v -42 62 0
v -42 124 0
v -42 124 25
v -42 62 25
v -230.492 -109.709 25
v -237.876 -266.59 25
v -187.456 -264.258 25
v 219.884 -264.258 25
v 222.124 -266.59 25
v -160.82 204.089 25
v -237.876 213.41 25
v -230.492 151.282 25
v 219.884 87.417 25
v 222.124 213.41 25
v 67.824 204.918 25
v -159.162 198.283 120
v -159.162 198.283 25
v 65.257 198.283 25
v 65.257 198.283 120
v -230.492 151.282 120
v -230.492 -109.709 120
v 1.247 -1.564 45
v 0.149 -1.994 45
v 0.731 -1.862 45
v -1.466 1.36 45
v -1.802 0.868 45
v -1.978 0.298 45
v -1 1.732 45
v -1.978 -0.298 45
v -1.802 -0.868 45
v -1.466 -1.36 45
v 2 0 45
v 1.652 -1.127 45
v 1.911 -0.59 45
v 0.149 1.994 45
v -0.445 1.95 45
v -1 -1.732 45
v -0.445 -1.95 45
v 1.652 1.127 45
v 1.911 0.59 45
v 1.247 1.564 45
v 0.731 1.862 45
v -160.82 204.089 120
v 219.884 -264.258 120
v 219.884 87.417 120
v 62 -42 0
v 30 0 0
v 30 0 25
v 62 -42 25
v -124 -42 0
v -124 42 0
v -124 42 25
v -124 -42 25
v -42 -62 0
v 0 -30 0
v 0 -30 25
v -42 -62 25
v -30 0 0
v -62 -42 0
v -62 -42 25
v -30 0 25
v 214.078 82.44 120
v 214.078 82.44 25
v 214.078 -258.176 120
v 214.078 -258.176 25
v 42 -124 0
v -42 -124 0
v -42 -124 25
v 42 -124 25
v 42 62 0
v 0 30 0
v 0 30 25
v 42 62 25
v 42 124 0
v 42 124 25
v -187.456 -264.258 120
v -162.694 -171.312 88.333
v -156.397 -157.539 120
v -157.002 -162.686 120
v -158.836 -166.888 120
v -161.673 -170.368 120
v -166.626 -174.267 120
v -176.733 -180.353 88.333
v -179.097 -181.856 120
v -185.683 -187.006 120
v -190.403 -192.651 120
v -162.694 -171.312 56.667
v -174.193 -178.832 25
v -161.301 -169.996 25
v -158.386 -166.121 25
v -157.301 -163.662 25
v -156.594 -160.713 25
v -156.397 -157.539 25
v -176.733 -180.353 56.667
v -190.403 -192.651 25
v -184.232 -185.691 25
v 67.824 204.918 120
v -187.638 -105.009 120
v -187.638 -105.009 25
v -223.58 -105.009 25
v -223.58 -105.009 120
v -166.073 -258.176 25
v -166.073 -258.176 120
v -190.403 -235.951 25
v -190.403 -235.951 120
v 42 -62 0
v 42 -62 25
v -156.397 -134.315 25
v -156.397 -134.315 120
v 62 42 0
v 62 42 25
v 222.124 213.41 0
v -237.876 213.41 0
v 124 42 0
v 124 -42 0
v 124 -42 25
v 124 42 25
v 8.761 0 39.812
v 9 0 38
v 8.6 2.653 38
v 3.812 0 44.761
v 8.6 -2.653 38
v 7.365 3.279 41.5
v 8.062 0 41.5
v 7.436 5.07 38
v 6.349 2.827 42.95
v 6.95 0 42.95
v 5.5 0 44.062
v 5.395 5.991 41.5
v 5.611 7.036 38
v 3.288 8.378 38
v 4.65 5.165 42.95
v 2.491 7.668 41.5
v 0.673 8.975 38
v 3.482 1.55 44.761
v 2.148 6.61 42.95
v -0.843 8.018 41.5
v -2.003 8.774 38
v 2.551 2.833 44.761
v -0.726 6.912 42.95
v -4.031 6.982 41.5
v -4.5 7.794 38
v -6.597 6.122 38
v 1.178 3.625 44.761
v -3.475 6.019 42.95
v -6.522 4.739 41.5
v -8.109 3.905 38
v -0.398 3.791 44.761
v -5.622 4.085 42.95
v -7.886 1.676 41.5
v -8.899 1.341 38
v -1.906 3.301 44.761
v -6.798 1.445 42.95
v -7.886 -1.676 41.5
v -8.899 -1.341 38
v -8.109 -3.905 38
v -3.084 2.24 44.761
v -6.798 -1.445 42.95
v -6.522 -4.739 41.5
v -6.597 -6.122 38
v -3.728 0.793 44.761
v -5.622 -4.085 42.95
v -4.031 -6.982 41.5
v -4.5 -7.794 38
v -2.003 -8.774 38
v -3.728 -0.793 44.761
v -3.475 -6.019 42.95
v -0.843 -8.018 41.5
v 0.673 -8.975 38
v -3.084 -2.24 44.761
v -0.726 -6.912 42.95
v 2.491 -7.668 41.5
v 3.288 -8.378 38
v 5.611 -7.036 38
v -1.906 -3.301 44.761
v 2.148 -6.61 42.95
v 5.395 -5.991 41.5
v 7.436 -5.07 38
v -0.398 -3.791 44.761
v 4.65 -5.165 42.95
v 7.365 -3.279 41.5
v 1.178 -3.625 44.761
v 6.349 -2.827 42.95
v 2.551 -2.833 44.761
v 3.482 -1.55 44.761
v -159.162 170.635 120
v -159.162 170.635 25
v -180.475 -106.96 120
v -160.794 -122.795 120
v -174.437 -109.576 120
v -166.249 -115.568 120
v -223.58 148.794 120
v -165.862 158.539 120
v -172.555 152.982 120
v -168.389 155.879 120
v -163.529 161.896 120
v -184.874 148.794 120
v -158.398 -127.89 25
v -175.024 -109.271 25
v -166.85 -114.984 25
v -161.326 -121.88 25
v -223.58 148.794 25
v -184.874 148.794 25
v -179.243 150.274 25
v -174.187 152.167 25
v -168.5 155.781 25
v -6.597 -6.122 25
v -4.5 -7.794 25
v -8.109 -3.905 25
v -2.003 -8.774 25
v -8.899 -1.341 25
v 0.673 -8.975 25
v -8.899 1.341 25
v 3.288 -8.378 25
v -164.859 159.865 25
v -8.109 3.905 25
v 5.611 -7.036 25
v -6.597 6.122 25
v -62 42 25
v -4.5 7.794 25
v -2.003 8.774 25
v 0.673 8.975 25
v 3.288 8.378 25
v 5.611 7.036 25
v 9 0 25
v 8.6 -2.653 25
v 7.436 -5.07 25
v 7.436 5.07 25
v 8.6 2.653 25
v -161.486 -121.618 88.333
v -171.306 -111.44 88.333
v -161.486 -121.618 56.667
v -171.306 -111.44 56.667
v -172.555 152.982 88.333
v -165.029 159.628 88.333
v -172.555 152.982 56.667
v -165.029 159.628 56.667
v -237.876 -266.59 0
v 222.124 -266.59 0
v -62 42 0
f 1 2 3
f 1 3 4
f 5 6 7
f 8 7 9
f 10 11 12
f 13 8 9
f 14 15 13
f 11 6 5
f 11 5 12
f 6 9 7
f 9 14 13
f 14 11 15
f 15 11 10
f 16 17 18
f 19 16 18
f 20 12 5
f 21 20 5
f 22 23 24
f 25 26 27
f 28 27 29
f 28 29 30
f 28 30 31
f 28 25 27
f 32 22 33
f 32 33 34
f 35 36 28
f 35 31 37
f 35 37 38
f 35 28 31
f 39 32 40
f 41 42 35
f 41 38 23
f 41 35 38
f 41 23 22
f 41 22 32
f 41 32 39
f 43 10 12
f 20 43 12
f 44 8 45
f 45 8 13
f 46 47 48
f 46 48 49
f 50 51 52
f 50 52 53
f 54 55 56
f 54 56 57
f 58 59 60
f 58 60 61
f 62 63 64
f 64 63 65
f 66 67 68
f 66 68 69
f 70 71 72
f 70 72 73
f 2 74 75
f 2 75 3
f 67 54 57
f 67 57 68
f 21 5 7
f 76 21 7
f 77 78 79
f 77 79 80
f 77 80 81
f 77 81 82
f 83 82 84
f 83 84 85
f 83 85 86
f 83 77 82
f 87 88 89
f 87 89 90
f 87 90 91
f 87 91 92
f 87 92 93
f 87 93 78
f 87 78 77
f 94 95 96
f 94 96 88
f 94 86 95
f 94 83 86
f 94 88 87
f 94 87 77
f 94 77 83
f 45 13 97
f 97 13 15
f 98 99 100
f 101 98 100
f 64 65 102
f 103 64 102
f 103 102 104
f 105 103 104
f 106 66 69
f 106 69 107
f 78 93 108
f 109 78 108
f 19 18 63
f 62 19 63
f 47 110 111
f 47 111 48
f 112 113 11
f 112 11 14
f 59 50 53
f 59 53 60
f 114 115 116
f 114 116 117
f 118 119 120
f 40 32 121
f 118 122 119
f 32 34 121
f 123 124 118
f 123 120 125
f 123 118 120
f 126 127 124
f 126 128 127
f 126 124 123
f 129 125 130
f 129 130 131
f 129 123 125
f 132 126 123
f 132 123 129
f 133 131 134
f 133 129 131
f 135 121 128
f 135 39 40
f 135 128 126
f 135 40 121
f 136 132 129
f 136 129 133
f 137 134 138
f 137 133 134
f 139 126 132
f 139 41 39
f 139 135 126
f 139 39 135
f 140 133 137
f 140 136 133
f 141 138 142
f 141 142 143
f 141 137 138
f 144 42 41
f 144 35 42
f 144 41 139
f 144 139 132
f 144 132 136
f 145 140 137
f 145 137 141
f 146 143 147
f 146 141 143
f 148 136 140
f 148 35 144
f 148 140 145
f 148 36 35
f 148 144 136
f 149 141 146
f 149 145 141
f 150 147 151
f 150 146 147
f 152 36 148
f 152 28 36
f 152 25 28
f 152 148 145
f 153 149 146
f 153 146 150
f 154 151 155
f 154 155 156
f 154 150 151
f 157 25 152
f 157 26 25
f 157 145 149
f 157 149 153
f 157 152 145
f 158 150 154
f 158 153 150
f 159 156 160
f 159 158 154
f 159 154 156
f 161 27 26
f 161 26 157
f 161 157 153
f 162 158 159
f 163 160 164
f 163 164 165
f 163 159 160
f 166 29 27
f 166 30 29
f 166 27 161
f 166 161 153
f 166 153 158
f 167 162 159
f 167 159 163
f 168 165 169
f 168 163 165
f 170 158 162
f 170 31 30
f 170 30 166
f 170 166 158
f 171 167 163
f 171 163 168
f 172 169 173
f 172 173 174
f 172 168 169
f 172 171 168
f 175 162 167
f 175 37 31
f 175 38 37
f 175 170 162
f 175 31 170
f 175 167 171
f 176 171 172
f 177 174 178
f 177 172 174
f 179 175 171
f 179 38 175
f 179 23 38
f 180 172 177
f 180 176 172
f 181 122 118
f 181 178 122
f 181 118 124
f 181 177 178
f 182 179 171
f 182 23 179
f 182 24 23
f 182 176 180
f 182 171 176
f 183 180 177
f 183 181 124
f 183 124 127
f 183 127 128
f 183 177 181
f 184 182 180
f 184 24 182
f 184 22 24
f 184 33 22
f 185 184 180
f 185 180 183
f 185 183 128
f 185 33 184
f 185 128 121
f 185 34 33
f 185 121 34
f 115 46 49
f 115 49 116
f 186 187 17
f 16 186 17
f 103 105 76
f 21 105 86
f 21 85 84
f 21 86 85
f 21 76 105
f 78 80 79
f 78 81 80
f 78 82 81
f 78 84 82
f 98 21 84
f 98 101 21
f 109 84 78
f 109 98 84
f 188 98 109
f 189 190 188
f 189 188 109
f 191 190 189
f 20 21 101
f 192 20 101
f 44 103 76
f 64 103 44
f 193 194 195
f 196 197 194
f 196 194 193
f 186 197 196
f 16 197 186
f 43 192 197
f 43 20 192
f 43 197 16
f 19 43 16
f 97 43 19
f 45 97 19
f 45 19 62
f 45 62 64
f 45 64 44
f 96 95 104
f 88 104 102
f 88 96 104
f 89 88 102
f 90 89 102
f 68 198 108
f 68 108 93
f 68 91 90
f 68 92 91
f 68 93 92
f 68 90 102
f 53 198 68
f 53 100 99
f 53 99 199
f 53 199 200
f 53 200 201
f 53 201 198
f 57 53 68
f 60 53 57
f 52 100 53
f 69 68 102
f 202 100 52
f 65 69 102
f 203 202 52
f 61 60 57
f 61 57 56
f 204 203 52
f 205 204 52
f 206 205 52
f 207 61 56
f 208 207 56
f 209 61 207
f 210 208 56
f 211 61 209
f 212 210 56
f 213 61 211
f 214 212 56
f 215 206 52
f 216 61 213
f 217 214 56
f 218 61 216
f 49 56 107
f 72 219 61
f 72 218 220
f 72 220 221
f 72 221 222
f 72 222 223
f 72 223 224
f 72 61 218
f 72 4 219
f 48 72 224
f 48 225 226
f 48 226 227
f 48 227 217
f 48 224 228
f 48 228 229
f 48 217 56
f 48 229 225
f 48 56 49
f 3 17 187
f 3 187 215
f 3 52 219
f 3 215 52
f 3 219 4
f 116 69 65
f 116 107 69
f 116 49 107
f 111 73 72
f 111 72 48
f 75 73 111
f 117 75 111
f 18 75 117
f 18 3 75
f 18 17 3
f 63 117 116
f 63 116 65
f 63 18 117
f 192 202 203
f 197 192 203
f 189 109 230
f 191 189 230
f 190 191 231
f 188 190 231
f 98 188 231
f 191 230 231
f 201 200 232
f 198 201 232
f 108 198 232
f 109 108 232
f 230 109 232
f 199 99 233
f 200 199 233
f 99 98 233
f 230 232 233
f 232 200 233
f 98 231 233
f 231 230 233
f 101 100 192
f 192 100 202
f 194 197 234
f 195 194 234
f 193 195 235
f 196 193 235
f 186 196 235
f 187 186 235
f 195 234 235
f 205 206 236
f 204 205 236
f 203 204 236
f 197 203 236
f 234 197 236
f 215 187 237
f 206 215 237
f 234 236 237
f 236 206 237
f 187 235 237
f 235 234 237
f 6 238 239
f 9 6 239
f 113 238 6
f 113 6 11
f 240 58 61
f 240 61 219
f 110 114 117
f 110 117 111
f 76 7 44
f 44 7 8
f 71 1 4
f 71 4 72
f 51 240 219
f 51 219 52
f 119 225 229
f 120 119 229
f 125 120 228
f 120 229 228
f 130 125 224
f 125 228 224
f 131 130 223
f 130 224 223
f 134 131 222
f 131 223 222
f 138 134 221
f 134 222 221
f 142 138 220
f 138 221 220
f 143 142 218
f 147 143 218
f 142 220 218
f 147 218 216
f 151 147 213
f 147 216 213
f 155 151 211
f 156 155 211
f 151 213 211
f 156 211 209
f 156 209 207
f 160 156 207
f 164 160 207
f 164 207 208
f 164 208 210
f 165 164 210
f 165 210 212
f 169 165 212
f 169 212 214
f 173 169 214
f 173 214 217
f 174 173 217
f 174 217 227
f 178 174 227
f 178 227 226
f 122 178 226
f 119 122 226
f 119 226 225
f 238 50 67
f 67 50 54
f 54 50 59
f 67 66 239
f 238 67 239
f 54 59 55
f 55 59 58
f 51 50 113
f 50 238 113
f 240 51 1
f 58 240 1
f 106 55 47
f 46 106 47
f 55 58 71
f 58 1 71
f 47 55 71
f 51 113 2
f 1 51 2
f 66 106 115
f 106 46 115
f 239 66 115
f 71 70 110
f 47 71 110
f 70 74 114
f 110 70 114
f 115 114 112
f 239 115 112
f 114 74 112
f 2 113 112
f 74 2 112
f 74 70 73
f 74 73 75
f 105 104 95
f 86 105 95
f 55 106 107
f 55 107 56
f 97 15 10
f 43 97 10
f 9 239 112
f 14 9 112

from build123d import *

# Parameters (mm, degrees)
F0_W     = 460
F0_H     = 480
F1_DEPTH = 25
F3_DEPTH = 120
F5_DEPTH = 25
F4_R     = 9
F6_DEPTH = 45
F7_R     = 7


with BuildPart() as f1:
    # F0 (on Top) → F1 (new body)
    with BuildSketch(Plane.XY):
        with Locations((-7.875566, -26.590223)):
            Rectangle(F0_W, F0_H)
    extrude(amount=F1_DEPTH)

    # F2 (on Top) → F3 (join)
    with BuildSketch(Plane.XY):
        Polygon((67.823559, 204.918116), (-160.820395, 204.088688), (-230.491832, 151.282176), (-230.491832, -109.70924), (-187.456321, -264.258176), (219.884232, -264.258176), (219.884232, 87.416694), align=None)
        with BuildLine():
            Line((-159.161553, 170.635357), (-159.161553, 198.282734))
            Line((-159.161553, 198.282734), (65.256598, 198.282734))
            Line((65.256598, 198.282734), (214.078277, 82.440153))
            Line((214.078277, 82.440153), (214.078277, -258.175731))
            Line((214.078277, -258.175731), (-166.073412, -258.175731))
            Line((-166.073412, -258.175731), (-190.403104, -235.951498))
            Line((-190.403104, -235.951498), (-190.403104, -192.651421))
            add(Edge.make_bspline(
                [(-156.396821, -157.539219), (-156.12036, -176.339447), (-179.620609, -176.062971), (-190.403104, -192.651421)],
                knots=[0, 0, 0, 0, 48.880405, 48.880405, 48.880405, 48.880405], degree=3))
            Line((-156.396821, -157.539219), (-156.396821, -134.315416))
            add(Edge.make_bspline(
                [(-156.396821, -134.315416), (-159.714505, -120.768197), (-167.455778, -109.156288), (-187.638372, -105.009183)],
                knots=[0, 0, 0, 0, 42.835614, 42.835614, 42.835614, 42.835614], degree=3))
            Line((-187.638372, -105.009183), (-223.579988, -105.009183))
            Line((-223.579988, -105.009183), (-223.579988, 148.793906))
            Line((-223.579988, 148.793906), (-184.873641, 148.793906))
            add(Edge.make_bspline(
                [(-184.873641, 148.793906), (-169.114619, 152.388066), (-165.243983, 156.81164), (-159.161553, 170.635357)],
                knots=[0, 0, 0, 0, 33.736634, 33.736634, 33.736634, 33.736634], degree=3))
        make_face(mode=Mode.SUBTRACT)
    extrude(amount=F3_DEPTH)

    # F4 (on Top) → F5 (cut, through all)
    with BuildSketch(Plane.XY):
        Polygon((0, 124), (-42, 124), (-42, 62), (0, 30), (42, 62), (42, 124), align=None)
        Polygon((124, 0), (124, 42), (62, 42), (30, 0), (62, -42), (124, -42), align=None)
        Polygon((-124, 0), (-124, -42), (-62, -42), (-30, 0), (-62, 42), (-124, 42), align=None)
        Polygon((0, -124), (42, -124), (42, -62), (0, -30), (-42, -62), (-42, -124), align=None)
    extrude(amount=F5_DEPTH, mode=Mode.SUBTRACT)

    # F4 (on Top) → F6 (join)
    with BuildSketch(Plane.XY):
        Circle(F4_R)
    extrude(amount=F6_DEPTH)

    # F7
    f7_edges = [f1.edges().sort_by_distance(p)[0] for p in [
        (-9, 0, 45),
    ]]
    fillet(f7_edges, radius=F7_R)


solid = f1.part
